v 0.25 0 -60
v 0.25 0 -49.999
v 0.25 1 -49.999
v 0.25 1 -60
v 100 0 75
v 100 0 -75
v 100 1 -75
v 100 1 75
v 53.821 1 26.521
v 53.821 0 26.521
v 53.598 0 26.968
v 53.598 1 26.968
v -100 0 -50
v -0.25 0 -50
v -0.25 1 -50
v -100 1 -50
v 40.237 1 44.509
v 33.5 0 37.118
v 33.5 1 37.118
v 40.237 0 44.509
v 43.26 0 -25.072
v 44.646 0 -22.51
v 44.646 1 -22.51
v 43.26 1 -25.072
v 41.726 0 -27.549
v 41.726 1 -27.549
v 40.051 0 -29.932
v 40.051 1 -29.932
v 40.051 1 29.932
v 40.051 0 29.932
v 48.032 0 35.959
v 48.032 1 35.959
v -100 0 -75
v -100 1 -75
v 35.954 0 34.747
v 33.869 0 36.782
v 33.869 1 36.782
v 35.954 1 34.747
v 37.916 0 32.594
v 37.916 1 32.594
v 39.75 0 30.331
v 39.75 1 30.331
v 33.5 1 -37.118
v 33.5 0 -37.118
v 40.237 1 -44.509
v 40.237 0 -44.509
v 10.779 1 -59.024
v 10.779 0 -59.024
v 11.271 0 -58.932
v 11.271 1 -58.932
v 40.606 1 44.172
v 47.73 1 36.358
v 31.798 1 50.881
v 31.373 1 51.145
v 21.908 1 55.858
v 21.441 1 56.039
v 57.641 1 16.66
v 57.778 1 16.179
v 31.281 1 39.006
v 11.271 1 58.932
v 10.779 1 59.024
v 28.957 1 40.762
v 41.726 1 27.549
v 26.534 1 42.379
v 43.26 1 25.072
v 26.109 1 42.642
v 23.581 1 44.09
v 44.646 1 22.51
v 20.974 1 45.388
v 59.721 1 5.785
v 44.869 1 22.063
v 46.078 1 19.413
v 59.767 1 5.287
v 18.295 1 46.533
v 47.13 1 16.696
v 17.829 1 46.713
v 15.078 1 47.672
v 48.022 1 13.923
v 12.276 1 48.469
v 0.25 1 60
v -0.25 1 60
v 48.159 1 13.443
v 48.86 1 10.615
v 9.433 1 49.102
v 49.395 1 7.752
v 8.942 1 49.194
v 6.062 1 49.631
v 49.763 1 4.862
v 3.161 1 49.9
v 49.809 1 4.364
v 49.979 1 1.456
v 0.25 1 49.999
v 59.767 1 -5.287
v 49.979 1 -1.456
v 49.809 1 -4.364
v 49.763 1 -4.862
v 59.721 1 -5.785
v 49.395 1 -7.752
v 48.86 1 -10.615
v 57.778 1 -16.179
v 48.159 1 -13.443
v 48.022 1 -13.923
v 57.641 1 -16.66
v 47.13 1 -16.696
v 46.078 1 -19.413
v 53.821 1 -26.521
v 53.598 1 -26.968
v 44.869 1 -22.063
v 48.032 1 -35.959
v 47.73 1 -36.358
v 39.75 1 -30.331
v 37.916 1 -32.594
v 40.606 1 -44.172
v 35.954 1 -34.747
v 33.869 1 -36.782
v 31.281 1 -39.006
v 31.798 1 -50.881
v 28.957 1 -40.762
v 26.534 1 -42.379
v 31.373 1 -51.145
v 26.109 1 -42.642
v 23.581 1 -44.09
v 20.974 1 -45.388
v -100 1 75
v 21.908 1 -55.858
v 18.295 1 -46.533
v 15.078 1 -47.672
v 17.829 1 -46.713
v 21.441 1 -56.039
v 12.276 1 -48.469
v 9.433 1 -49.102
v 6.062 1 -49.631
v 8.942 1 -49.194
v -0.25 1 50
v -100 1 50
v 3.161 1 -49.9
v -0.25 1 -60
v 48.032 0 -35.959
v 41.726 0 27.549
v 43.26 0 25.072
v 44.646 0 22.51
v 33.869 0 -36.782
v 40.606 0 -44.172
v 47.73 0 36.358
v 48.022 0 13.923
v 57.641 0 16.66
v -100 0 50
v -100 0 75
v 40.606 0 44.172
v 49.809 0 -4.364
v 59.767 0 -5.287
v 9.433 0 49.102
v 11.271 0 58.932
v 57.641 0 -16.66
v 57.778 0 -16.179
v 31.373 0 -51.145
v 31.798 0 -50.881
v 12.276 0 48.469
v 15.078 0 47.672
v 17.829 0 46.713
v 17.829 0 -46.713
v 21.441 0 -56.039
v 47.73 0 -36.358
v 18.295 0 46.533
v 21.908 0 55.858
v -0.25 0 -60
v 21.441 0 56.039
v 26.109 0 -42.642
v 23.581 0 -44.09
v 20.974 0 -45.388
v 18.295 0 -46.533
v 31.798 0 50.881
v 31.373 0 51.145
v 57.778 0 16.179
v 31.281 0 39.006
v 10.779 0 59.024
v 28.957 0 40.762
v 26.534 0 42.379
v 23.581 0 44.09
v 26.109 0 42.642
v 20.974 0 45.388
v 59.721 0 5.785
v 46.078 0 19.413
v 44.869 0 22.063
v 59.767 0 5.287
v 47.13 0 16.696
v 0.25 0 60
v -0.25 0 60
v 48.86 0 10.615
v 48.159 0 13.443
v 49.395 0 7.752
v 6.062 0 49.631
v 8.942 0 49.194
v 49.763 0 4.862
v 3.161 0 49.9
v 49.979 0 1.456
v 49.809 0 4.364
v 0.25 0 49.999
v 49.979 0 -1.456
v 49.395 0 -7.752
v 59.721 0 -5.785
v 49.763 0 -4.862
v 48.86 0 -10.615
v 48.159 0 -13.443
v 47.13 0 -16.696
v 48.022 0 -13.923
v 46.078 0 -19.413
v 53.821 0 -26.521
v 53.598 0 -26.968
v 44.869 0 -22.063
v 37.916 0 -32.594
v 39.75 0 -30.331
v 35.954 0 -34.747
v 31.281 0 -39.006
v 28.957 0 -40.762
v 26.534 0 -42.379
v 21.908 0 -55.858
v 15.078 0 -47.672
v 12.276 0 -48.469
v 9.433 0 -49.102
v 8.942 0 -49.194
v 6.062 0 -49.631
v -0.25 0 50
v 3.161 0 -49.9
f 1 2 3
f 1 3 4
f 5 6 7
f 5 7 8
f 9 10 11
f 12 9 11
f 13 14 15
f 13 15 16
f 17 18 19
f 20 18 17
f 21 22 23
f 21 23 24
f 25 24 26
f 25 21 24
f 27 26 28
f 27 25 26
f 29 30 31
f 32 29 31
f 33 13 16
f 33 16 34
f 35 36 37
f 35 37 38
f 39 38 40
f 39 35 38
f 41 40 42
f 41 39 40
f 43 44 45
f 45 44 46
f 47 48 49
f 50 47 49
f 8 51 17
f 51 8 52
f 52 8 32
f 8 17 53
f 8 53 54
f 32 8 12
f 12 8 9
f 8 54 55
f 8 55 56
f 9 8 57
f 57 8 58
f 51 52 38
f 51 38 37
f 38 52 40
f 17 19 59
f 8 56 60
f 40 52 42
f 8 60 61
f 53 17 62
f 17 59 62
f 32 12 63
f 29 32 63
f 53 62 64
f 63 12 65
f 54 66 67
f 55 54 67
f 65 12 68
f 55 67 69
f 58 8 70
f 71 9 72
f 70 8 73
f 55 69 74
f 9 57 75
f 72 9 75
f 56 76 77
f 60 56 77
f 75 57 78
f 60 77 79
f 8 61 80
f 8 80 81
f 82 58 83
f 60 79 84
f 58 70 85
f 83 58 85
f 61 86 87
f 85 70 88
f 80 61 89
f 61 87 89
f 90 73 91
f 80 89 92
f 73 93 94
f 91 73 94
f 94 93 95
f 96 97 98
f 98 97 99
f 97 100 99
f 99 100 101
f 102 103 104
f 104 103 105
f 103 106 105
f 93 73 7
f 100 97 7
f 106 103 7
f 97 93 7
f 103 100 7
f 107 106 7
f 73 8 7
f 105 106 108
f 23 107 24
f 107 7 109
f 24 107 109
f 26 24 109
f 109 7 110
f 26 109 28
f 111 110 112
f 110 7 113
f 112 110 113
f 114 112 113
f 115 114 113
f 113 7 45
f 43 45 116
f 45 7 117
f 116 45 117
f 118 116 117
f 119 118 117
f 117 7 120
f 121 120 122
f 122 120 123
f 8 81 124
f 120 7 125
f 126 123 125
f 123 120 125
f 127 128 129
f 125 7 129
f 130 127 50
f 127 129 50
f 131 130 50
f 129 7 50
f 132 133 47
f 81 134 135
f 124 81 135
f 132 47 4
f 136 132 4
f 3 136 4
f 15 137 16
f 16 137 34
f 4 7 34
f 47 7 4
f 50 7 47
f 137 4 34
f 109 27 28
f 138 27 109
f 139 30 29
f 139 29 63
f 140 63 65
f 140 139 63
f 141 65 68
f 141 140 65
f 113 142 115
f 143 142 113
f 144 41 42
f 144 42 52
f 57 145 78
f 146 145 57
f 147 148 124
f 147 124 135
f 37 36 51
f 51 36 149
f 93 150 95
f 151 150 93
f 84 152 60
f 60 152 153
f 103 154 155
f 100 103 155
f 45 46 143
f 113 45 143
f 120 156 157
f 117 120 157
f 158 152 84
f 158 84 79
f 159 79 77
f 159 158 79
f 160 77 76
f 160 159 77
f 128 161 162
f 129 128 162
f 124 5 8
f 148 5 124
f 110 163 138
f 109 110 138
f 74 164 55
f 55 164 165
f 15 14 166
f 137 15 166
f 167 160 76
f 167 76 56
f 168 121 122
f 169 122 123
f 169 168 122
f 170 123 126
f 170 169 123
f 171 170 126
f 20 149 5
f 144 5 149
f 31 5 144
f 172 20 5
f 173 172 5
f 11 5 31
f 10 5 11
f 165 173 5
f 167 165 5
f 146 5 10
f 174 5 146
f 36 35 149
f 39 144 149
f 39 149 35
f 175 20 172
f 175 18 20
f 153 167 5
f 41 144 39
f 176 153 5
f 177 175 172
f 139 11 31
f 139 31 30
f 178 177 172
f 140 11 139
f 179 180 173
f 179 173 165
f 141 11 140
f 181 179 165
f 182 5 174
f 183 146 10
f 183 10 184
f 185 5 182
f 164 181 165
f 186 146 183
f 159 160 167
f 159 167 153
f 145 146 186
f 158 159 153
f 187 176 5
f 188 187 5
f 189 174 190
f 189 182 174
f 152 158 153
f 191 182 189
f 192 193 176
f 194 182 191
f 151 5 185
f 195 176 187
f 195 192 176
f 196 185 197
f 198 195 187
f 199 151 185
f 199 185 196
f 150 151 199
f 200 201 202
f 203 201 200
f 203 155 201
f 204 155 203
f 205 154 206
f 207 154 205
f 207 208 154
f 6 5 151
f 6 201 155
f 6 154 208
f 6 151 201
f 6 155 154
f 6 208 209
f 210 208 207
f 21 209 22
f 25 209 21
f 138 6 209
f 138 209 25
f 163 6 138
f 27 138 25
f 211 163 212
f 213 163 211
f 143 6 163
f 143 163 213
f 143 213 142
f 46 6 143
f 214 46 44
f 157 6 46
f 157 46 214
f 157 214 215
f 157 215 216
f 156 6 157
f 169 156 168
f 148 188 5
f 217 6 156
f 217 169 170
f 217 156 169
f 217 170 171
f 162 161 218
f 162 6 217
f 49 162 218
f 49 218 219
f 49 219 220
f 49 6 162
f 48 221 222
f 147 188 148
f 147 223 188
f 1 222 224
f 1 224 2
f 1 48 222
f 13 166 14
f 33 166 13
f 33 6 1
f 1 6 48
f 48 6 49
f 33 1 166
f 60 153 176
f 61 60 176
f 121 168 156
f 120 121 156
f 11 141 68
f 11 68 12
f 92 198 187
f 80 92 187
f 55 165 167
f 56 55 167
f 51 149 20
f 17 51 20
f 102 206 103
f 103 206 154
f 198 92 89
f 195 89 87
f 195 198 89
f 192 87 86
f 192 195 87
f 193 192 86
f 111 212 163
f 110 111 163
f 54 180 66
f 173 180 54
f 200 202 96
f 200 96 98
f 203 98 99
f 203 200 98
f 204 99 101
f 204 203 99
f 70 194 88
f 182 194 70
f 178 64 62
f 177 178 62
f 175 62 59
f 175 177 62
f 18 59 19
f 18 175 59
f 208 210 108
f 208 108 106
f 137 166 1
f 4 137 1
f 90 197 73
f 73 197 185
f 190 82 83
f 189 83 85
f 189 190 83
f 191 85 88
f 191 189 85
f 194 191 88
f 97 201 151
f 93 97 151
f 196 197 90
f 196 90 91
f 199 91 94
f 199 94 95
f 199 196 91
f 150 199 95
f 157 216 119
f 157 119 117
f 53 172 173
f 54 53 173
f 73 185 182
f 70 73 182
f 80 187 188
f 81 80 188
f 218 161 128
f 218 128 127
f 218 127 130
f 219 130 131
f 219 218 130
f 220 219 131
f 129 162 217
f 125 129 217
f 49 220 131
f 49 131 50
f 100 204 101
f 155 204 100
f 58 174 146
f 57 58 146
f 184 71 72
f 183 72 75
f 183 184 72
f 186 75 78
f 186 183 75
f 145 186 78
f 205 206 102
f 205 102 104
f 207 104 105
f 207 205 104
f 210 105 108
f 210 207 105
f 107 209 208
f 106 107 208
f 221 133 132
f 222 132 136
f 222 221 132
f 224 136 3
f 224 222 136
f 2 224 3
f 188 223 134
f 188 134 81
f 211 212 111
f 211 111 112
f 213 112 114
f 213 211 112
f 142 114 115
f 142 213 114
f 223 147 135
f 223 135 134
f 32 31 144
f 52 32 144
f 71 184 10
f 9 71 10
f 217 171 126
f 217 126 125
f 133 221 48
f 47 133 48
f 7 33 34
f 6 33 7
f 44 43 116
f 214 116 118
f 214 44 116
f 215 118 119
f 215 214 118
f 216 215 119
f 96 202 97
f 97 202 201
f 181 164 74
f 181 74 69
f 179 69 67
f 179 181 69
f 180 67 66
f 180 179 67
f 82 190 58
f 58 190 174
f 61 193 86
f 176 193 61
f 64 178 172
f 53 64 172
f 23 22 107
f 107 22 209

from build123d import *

# Parameters (mm, degrees)
AUFSATZ_LINEAR_AUSTRAGEN1_DEPTH      = 1
SKIZZE2_W                            = 0.5
SKIZZE2_H                            = 15
SCHNITT_LINEAR_AUSTRAGEN_D_NN4_DEPTH = 2
KREISMUSTER12_COUNT                  = 18
KREISMUSTER12_ANGLE                  = 180


with BuildPart() as part:
    # Skizze1 → Aufsatz-Linear austragen1 (new body)
    with BuildSketch(Plane(origin=(0, 0, 0), x_dir=(1, 0, 0), z_dir=(0, 1, 0))):
        with BuildLine():
            Line((0, 50), (-100, 50))
            Line((-100, 50), (-100, 75))
            Line((-100, 75), (100, 75))
            Line((100, 75), (100, -75))
            Line((100, -75), (-100, -75))
            Line((-100, -75), (-100, -50))
            Line((-100, -50), (0, -50))
            ThreePointArc((0, -50), (50, 0), (0, 50))
        make_face()
    extrude(amount=AUFSATZ_LINEAR_AUSTRAGEN1_DEPTH)

    # Skizze2 → Schnitt-Linear-Austragen-Dünn4 (cut)
    with BuildSketch(Plane(origin=(0, 0, 0), x_dir=(1, 0, 0), z_dir=(0, 1, 0))):
        with Locations((0, 52.5)):
            Rectangle(SKIZZE2_W, SKIZZE2_H)
    schnitt_linear_austragen_d_nn4 = extrude(amount=SCHNITT_LINEAR_AUSTRAGEN_D_NN4_DEPTH, mode=Mode.SUBTRACT)

    # Kreismuster12: Schnitt-Linear-Austragen-Dünn4 ×18 about axis
    kreismuster12_axis = Axis((0, 0, 0), (0, -1, 0))
    for i in range(1, KREISMUSTER12_COUNT):
        add(schnitt_linear_austragen_d_nn4.rotate(kreismuster12_axis, i * KREISMUSTER12_ANGLE / (KREISMUSTER12_COUNT - 1)), mode=Mode.SUBTRACT)


solid = part.part
